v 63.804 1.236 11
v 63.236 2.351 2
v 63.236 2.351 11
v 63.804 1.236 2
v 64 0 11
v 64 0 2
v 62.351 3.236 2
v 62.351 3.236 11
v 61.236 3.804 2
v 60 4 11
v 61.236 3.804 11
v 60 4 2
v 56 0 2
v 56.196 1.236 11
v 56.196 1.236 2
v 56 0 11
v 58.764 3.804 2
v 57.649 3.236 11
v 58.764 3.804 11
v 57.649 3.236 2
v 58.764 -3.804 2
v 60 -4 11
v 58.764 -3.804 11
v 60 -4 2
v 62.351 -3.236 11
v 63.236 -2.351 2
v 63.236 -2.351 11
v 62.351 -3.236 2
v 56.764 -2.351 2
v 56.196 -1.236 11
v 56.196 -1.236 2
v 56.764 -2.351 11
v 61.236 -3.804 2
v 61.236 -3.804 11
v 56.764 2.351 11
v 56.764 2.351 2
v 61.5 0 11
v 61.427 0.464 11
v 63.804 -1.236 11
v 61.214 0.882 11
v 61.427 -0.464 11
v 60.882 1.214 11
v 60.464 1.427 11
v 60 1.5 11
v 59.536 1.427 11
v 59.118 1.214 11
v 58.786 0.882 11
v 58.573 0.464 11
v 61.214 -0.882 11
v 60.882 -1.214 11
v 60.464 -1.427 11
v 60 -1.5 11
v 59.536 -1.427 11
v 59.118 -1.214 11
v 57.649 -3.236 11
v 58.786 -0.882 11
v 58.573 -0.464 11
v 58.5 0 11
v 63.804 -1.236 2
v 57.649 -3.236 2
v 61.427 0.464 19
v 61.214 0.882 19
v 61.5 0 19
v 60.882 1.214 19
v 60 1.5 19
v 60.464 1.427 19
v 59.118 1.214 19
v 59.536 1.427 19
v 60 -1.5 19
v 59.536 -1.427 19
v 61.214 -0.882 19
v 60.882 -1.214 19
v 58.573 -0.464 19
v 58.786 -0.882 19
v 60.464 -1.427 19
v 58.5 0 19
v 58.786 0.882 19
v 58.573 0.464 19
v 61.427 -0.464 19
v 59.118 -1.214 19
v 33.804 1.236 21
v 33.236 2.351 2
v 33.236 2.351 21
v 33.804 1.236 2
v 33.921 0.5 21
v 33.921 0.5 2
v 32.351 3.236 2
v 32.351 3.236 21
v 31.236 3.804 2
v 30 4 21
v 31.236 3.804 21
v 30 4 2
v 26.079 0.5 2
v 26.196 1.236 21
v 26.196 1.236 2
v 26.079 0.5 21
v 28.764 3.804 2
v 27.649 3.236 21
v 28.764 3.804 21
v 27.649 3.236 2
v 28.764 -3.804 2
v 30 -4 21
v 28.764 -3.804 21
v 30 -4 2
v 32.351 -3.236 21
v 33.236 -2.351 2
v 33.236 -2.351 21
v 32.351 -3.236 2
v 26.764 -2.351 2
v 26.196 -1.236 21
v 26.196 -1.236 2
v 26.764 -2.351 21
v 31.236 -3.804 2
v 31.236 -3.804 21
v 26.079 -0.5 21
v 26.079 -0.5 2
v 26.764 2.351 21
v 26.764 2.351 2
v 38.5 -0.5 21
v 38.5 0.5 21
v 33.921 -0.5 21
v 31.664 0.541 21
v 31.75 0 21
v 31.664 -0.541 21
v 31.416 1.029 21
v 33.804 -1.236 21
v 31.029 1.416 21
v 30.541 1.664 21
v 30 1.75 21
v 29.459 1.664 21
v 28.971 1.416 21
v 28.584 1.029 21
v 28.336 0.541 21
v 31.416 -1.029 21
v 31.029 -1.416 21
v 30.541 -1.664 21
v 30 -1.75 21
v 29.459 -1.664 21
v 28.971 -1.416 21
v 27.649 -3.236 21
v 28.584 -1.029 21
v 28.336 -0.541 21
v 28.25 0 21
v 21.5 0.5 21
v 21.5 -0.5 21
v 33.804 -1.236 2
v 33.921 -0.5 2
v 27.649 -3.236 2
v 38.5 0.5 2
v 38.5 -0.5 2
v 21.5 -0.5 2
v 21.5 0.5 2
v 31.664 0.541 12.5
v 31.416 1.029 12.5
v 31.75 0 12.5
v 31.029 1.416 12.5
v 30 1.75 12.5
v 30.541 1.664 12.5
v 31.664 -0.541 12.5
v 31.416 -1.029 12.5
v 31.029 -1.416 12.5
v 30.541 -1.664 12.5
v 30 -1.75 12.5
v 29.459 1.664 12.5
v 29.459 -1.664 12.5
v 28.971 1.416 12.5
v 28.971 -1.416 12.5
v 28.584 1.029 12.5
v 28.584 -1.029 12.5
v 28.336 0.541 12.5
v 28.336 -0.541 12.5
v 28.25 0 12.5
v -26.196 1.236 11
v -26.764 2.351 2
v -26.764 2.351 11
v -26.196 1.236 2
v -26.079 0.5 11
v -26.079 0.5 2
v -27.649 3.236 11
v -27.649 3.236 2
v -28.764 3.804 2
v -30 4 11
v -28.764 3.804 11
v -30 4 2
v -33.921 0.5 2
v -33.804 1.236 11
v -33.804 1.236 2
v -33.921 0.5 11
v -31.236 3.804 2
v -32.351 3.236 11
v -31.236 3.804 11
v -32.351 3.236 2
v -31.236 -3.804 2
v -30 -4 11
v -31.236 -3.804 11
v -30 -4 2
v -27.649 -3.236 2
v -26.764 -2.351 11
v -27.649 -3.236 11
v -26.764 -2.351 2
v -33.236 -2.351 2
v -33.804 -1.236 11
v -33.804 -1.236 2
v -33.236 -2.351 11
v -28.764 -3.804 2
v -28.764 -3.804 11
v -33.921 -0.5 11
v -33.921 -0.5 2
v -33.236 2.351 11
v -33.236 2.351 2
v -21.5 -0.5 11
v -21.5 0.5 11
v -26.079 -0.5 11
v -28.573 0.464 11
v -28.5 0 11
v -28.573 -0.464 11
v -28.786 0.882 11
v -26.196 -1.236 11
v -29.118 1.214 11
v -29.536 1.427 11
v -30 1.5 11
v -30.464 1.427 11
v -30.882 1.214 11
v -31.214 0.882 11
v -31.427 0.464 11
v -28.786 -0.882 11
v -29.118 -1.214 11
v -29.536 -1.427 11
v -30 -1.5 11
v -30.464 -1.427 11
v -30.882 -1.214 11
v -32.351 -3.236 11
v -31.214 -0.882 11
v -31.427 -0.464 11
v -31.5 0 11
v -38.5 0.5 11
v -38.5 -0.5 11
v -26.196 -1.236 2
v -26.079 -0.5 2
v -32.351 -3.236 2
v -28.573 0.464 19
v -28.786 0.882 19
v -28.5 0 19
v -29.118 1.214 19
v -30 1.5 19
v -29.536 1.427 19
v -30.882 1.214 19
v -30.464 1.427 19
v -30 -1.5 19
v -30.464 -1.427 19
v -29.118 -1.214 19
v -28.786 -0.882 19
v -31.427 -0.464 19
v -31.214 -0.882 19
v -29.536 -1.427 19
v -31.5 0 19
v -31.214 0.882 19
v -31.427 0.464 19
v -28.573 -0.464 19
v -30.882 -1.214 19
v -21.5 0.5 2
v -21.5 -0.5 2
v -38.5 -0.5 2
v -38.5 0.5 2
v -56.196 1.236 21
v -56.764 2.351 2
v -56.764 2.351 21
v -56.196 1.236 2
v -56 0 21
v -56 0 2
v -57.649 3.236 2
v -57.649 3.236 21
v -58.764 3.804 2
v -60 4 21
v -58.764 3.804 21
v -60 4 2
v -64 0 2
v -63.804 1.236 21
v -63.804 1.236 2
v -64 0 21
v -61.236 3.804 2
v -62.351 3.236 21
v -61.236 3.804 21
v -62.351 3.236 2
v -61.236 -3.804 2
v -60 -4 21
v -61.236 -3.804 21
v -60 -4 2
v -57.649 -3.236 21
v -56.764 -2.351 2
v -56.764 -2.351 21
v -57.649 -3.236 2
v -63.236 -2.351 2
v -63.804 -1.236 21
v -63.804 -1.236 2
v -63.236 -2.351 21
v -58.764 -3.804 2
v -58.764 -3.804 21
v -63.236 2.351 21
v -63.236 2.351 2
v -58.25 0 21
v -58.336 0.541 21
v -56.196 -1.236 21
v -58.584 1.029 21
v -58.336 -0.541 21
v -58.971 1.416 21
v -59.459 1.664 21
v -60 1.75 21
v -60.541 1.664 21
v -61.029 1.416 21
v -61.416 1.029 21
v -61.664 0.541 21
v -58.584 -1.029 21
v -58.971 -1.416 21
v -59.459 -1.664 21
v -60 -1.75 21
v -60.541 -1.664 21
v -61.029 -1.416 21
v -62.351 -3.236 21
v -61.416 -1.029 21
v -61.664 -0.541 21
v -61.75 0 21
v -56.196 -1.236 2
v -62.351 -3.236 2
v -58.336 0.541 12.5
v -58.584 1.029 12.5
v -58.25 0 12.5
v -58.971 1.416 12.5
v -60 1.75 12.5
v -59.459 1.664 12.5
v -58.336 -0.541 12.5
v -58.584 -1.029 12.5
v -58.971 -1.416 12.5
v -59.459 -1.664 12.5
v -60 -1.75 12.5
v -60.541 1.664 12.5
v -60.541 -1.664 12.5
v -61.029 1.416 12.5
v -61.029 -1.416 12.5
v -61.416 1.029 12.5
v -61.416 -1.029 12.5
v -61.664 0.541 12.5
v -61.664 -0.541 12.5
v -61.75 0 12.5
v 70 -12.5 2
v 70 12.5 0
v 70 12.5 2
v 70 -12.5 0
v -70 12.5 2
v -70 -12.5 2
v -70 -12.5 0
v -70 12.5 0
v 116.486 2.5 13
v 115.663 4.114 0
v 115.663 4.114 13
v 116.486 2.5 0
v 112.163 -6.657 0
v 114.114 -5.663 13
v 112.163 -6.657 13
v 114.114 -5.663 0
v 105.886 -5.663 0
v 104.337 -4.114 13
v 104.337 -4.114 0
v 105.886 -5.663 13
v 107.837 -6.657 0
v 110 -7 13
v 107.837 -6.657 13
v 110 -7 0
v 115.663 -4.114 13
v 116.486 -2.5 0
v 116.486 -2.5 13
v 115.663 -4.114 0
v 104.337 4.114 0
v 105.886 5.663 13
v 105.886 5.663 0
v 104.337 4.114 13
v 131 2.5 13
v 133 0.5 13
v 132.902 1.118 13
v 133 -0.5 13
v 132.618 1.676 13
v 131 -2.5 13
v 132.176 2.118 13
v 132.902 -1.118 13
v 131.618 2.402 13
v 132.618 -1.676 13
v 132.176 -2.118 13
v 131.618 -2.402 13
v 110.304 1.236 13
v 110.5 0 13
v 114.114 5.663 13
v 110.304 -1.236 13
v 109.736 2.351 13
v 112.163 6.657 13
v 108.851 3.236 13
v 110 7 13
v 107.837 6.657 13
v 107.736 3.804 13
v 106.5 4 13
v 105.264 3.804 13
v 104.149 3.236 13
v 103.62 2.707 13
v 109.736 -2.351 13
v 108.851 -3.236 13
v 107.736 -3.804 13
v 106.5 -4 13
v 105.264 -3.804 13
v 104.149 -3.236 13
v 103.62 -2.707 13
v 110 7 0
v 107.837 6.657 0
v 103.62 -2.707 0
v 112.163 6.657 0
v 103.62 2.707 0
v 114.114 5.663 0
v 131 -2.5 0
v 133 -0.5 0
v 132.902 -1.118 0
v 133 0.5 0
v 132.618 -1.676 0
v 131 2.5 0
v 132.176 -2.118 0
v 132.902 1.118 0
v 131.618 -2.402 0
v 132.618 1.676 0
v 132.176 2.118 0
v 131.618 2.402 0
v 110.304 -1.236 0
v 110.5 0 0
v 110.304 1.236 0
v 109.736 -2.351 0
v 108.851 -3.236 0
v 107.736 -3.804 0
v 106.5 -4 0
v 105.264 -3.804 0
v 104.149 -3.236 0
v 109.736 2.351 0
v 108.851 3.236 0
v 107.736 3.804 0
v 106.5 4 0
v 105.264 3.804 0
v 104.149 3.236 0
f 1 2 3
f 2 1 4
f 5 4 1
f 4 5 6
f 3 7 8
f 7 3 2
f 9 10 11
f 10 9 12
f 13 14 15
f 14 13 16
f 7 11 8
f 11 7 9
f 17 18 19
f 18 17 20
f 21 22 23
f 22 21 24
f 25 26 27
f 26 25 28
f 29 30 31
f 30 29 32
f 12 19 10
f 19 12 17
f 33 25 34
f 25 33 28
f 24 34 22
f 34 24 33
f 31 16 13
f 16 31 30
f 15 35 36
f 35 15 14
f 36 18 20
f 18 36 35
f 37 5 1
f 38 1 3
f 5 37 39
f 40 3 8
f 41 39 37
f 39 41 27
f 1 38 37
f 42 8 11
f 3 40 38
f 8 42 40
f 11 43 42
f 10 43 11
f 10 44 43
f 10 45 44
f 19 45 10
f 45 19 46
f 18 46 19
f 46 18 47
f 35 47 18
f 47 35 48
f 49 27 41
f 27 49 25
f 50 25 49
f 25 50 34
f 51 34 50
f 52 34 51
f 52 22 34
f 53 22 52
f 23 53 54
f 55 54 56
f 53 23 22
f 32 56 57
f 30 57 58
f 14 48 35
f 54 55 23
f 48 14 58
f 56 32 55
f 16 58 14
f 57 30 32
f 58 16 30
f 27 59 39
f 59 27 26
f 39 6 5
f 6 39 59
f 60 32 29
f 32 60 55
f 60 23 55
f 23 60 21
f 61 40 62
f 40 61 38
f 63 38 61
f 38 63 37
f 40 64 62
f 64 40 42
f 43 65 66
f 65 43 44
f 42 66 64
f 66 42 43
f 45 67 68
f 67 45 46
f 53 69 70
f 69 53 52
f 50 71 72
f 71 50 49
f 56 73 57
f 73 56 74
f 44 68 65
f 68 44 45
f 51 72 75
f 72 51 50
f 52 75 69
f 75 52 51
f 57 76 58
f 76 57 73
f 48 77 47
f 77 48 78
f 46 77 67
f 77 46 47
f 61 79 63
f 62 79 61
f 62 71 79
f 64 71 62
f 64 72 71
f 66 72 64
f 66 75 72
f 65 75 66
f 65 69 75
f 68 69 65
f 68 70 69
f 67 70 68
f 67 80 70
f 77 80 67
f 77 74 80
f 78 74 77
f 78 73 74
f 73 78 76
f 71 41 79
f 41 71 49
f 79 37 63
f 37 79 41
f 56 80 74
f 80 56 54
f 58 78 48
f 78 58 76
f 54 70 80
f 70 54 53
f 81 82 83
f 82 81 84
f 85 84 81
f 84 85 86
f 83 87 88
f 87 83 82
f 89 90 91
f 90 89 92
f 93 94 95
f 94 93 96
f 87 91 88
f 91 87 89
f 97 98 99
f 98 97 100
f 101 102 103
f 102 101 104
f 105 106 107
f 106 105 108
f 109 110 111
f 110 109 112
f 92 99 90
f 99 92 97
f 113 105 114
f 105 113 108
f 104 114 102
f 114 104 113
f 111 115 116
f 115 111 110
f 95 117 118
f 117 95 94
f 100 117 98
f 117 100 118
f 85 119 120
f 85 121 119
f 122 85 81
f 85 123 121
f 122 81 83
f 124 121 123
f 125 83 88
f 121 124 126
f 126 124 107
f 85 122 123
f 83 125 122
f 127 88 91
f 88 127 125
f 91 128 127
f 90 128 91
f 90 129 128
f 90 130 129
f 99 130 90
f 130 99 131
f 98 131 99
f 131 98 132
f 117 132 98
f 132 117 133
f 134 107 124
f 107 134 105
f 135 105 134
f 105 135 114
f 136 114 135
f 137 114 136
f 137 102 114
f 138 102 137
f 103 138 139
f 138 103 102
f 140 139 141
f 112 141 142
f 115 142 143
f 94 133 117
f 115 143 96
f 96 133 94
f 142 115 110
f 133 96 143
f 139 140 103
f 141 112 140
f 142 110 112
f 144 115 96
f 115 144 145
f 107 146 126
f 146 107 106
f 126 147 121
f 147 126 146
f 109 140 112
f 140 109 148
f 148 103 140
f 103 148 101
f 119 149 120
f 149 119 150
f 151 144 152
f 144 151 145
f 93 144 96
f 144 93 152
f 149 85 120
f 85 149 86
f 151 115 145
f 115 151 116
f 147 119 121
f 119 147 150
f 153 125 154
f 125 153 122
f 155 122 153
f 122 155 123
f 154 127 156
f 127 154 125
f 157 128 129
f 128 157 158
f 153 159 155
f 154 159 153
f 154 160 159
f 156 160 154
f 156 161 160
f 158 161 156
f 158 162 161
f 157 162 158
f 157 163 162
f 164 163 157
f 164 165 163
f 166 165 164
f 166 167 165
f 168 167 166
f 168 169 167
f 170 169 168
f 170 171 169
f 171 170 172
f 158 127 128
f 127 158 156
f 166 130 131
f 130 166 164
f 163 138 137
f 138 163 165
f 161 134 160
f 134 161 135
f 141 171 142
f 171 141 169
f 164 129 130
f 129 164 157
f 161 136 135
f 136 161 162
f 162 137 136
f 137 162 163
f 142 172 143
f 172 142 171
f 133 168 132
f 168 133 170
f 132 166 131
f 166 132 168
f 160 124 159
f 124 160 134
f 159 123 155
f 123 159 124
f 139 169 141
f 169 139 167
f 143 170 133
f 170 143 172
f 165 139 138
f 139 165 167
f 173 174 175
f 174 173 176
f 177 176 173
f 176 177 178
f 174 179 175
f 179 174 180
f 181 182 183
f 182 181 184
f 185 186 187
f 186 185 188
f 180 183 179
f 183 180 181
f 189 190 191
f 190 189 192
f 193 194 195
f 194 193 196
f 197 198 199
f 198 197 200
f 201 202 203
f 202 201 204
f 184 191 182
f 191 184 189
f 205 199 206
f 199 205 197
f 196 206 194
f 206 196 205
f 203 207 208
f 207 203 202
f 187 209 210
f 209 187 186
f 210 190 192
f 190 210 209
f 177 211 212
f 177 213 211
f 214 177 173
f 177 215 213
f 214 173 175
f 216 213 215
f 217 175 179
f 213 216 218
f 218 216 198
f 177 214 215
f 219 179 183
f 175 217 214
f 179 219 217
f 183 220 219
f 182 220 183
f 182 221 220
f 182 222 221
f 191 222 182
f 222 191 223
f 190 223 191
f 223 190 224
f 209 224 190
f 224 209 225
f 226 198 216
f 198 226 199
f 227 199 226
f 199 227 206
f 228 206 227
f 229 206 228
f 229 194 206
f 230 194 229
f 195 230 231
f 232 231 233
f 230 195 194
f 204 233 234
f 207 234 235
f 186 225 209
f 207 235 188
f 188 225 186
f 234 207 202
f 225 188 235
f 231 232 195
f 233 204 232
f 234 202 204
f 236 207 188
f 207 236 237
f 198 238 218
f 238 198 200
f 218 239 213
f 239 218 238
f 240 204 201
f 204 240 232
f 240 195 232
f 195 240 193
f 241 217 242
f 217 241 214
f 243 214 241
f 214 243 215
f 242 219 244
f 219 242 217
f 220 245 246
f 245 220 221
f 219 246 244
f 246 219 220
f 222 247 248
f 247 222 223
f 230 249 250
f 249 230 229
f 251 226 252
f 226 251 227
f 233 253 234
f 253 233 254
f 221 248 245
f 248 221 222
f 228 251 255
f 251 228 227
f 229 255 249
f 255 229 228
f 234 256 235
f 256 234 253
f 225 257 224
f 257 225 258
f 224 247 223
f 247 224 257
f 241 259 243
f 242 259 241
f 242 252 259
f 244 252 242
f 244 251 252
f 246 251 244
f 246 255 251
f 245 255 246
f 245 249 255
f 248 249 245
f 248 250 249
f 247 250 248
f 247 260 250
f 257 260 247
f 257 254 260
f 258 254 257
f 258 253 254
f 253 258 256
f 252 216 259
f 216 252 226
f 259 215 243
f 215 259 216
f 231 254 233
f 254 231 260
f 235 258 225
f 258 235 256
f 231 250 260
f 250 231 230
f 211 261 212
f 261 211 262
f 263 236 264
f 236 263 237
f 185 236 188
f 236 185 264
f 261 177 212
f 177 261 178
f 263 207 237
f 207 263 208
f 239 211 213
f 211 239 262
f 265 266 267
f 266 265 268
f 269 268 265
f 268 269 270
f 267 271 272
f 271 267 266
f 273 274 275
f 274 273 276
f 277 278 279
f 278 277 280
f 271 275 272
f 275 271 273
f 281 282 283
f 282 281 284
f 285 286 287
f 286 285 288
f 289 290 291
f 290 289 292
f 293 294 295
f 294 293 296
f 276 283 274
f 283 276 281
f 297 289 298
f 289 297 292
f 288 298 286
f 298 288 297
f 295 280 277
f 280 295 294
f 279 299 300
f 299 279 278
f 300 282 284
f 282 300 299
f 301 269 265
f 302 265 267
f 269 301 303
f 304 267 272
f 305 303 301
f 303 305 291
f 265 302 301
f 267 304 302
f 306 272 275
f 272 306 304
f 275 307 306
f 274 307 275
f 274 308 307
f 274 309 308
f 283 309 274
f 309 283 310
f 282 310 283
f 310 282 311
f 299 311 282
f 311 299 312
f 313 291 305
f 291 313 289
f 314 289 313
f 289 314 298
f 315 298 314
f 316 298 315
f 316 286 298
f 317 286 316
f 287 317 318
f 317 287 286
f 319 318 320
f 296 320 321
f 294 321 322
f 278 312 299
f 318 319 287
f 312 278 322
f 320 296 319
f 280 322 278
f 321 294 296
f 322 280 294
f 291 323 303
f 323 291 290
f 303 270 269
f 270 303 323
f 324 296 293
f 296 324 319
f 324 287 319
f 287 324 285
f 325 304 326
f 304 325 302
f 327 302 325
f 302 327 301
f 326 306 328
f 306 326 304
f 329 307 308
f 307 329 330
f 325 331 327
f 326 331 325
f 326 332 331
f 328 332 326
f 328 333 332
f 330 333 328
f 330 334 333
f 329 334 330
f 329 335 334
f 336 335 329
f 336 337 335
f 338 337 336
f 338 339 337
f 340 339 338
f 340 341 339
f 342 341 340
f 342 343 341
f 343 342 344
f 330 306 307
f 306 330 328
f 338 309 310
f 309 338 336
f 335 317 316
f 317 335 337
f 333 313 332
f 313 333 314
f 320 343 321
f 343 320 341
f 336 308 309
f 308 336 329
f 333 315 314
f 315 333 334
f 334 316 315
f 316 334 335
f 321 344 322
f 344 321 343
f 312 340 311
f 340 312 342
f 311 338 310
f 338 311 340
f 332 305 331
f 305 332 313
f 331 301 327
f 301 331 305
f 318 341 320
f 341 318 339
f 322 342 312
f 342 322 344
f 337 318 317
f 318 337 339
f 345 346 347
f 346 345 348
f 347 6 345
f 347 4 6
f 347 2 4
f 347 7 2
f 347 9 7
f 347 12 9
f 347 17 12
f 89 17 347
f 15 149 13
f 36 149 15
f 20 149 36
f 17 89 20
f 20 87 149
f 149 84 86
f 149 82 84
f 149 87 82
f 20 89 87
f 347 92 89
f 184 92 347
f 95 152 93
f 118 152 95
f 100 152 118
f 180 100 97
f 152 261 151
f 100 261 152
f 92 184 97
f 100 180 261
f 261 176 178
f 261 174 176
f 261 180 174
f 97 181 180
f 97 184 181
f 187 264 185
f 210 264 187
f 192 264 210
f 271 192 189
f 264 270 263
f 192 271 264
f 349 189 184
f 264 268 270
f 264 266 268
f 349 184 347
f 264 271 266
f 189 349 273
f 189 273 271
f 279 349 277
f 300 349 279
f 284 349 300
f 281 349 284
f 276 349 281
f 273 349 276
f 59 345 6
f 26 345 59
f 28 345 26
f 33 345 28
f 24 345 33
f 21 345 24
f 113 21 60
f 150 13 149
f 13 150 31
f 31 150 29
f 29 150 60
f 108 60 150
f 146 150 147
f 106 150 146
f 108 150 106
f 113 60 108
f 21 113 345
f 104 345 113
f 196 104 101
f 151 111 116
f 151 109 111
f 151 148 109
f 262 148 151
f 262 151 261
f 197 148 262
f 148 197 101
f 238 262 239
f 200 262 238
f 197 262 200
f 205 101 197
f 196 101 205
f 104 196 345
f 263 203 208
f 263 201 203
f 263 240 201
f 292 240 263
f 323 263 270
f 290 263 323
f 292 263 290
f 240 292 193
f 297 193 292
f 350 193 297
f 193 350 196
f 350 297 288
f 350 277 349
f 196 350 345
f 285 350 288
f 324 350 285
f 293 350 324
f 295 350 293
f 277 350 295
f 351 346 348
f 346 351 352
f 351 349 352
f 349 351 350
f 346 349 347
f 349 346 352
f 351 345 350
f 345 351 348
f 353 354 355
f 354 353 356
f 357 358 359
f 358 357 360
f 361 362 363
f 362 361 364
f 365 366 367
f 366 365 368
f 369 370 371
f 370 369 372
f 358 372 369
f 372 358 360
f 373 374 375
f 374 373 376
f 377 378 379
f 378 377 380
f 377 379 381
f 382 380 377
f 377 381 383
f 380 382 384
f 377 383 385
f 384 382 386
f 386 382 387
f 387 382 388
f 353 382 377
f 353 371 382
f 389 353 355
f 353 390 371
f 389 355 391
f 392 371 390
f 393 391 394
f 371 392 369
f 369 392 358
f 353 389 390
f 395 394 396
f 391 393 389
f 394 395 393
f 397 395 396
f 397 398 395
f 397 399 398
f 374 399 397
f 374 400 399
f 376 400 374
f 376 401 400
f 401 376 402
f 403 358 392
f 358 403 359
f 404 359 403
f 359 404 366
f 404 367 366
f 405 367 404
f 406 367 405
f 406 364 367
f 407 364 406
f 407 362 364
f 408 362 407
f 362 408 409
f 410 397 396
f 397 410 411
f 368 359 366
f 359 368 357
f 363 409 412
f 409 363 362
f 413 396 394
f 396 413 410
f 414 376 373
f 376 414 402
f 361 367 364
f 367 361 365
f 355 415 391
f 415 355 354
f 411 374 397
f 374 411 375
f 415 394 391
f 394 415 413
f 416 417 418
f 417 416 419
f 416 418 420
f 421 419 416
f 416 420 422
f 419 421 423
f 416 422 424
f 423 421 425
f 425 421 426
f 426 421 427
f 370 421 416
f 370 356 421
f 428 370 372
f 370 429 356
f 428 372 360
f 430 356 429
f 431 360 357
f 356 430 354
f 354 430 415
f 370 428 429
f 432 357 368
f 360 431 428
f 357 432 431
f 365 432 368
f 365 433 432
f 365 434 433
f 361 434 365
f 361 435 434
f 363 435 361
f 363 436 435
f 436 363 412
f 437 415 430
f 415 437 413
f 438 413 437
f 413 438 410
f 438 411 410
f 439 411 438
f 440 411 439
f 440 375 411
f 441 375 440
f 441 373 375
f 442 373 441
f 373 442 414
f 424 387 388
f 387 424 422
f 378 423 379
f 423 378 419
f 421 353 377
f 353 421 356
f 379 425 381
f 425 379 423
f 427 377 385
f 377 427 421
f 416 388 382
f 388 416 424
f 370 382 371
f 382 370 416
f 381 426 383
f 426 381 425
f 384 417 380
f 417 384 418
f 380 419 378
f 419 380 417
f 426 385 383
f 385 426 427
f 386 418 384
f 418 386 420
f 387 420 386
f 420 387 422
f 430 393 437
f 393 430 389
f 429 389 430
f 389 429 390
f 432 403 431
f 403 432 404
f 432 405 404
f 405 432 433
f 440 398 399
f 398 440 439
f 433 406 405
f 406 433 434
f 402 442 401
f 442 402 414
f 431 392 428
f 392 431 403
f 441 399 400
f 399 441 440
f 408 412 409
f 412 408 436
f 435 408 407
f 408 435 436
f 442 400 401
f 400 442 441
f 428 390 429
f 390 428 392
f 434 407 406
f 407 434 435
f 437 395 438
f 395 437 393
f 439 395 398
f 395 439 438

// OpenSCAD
/* [Main dimension] */
// Total length of spool from end to end
totalLength = 140;
// Width of spool
totalWidth = 25;
// Thickness of walls
wallThickness = 2;

/* [Hidden] */
wallRounding = 2;

/* [Pin dimensions] */
// Width of big part of pins
bigPinWidth = 8;
// Height of big part of pins
bigPinHeight = 10;
// Width of small part of pins
smallPinWidth = 3;
// Height of small part of pins
smallPinHeight = 8;

// Length of "hook holder" wall
hookHolderLength = 9;
// Width of "hook holder" wall
hookHolderWidth = 1;

/* [Pin placement] */
// Distance from end for placement of first pair of pins
pin1Distance = 10;
// Length from end for placement of second pair of pins
pin2Distance = 40;

/* [Printer compensation] */
// Make hole slightly bigger to compensate for 3d printer inaccuracy
// Make hole inside pin this much wider than the small pin
holeCompensationWidth = 0.5;
// Make hole inside pin this much longer than the small pin
holeCompensationLength = 1;


/* [Lineholder] */
// Make lineholder hole this much wider than the big pin
lineHolderHoleWidthCompensation = 1.5;
lineHolderHoleThickness = bigPinWidth + lineHolderHoleWidthCompensation;
// Make lineholder outwards circle this much wider than the big pin
lineHolderCircleThicknessIncrement = 6;
lineHolderCircleThickness = bigPinWidth + lineHolderCircleThicknessIncrement;

// Thickness of "handle"
lineHolderHandleThickness = 3;
// Wiggle room for width. How much space is left on the sides
lineHolderHandleWidthWiggleRoom = 5;
lineHolderHandleWidth = bigPinHeight+smallPinHeight-lineHolderHandleWidthWiggleRoom;
// Length of the handle
lineHolderHandleLength = 20;


// Smoothness (of circles). 
// Can be put lower(20) when testing for better performance, and higher(40) for final export
$fn = 20 + 0;


wholeSpool();
lineHolder();

module bottomPlate () {
    color("blue")
    translate(v = [0, 0, wallThickness/2])
    // The roundedcube() screws up the wallthickness and
    // everything else becomes wrong...
    /*
    roundedcube(
        [
        totalLength,
        totalWidth,
        wallThickness
        ]
        ,
        true,
        wallRounding,
        "z"
    );
    */
    cube([totalLength, totalWidth, wallThickness], true);
}


module pin (hookHolder) {
    bigLift = (wallThickness/2)+(bigPinHeight/2);
    echo(bigLift=bigLift);
    color("red")

    translate(v = [0, 0, bigLift])
        cylinder(h=bigPinHeight, d=bigPinWidth, center=true);

    color("green")
    translate(v = [0, 0, bigLift+bigPinHeight-1])
        cylinder(h=smallPinHeight, d=smallPinWidth, center=true);

    if (hookHolder) {
        color("purple")
        translate(
            v = [
                    0,
                    0,
                    (wallThickness/2)+((bigPinHeight)/2)
                ]
            )
            cube(
                [
                    bigPinWidth+hookHolderLength,
                    hookHolderWidth,
                    bigPinHeight
                ],
                true
            );
    }
}

module hole (hookHolder) {
    color("orange")
    difference() {
    PinForHole(hookHolder);


    color("green")
    translate(
        v = [
            0,
            0,
            bigPinHeight+bigPinHeight-(smallPinHeight/2)+holeCompensationLength
            ]
        )
        cylinder(
        h=smallPinHeight+holeCompensationLength,
        d=smallPinWidth+holeCompensationWidth,
        center=true
        );
    }
}

module PinForHole(hookHolder) {
        translate(
            v = [
                    0,
                    0,
                    (((bigPinHeight+bigPinHeight)/2)+(wallThickness/2))
            ]
        )
        cylinder(h=bigPinHeight+bigPinHeight, d=bigPinWidth, center=true);
    if (hookHolder) {
        color("purple")
        translate(
        v = [
                0,
                0,
                ((wallThickness/2)+(bigPinHeight+bigPinHeight)/2)
            ]
        )
        cube(
            [
                bigPinWidth+hookHolderLength,
                hookHolderWidth,
                bigPinHeight+bigPinHeight
            ],
            true
        );
    }
}


module wholeSpool() {
    bottomPlate ();
    // 1: Create pin
    translate(v = [(totalLength/2)-pin1Distance, 0, 0]) pin(false);

    // 2: Create hole
    translate(v = [(totalLength/2)-pin2Distance, 0, 0]) hole(true);

    // 3: Create pin
    translate(v = [-(totalLength/2)+pin2Distance, 0, 0]) pin(true);
    //translate(v = [-(totalLength/2)+26, 0, 0]) hole();

    // 4: Create hole
    translate(v = [-(totalLength/2)+pin1Distance, 0, 0]) hole(false);
}


module lineHolder () {
    color("grey")
    difference () {
        lineHolderParts();
        translate(v = [(totalLength/2)+36.5, 0, 0])
       cylinder(h=bigPinHeight+smallPinHeight+20, d=bigPinWidth, center=true);
    }

}

module lineHolderParts () {
    color("grey")
       translate(v = [(totalLength/2)+ 40, 0, lineHolderHandleWidth/2])
         cylinder(h=lineHolderHandleWidth, d=lineHolderCircleThickness, center=true);
       translate(v = [(totalLength/2)+ 53, 0, lineHolderHandleWidth/2])
         roundedcube([lineHolderHandleLength, lineHolderHandleThickness, lineHolderHandleWidth], true, wallRounding, "z");
    }





// More information: https://danielupshaw.com/openscad-rounded-corners/

// Set to 0.01 for higher definition curves (renders slower)
$fs = 0.15;

module roundedcube(size = [1, 1, 1], center = false, radius = 0.5, apply_to = "all") {
	// If single value, convert to [x, y, z] vector
	size = (size[0] == undef) ? [size, size, size] : size;

	translate_min = radius;
	translate_xmax = size[0] - radius;
	translate_ymax = size[1] - radius;
	translate_zmax = size[2] - radius;

	diameter = radius * 2;

	obj_translate = (center == false) ?
		[0, 0, 0] : [
			-(size[0] / 2),
			-(size[1] / 2),
			-(size[2] / 2)
		];

	translate(v = obj_translate) {
		hull() {
			for (translate_x = [translate_min, translate_xmax]) {
				x_at = (translate_x == translate_min) ? "min" : "max";
				for (translate_y = [translate_min, translate_ymax]) {
					y_at = (translate_y == translate_min) ? "min" : "max";
					for (translate_z = [translate_min, translate_zmax]) {
						z_at = (translate_z == translate_min) ? "min" : "max";

						translate(v = [translate_x, translate_y, translate_z])
						if (
							(apply_to == "all") ||
							(apply_to == "xmin" && x_at == "min") || (apply_to == "xmax" && x_at == "max") ||
							(apply_to == "ymin" && y_at == "min") || (apply_to == "ymax" && y_at == "max") ||
							(apply_to == "zmin" && z_at == "min") || (apply_to == "zmax" && z_at == "max")
						) {
							sphere(r = radius);
						} else {
							rotate = 
								(apply_to == "xmin" || apply_to == "xmax" || apply_to == "x") ? [0, 90, 0] : (
								(apply_to == "ymin" || apply_to == "ymax" || apply_to == "y") ? [90, 90, 0] :
								[0, 0, 0]
							);
							rotate(a = rotate)
							cylinder(h = diameter, r = radius, center = true);
						}
					}
				}
			}
		}
	}
}
